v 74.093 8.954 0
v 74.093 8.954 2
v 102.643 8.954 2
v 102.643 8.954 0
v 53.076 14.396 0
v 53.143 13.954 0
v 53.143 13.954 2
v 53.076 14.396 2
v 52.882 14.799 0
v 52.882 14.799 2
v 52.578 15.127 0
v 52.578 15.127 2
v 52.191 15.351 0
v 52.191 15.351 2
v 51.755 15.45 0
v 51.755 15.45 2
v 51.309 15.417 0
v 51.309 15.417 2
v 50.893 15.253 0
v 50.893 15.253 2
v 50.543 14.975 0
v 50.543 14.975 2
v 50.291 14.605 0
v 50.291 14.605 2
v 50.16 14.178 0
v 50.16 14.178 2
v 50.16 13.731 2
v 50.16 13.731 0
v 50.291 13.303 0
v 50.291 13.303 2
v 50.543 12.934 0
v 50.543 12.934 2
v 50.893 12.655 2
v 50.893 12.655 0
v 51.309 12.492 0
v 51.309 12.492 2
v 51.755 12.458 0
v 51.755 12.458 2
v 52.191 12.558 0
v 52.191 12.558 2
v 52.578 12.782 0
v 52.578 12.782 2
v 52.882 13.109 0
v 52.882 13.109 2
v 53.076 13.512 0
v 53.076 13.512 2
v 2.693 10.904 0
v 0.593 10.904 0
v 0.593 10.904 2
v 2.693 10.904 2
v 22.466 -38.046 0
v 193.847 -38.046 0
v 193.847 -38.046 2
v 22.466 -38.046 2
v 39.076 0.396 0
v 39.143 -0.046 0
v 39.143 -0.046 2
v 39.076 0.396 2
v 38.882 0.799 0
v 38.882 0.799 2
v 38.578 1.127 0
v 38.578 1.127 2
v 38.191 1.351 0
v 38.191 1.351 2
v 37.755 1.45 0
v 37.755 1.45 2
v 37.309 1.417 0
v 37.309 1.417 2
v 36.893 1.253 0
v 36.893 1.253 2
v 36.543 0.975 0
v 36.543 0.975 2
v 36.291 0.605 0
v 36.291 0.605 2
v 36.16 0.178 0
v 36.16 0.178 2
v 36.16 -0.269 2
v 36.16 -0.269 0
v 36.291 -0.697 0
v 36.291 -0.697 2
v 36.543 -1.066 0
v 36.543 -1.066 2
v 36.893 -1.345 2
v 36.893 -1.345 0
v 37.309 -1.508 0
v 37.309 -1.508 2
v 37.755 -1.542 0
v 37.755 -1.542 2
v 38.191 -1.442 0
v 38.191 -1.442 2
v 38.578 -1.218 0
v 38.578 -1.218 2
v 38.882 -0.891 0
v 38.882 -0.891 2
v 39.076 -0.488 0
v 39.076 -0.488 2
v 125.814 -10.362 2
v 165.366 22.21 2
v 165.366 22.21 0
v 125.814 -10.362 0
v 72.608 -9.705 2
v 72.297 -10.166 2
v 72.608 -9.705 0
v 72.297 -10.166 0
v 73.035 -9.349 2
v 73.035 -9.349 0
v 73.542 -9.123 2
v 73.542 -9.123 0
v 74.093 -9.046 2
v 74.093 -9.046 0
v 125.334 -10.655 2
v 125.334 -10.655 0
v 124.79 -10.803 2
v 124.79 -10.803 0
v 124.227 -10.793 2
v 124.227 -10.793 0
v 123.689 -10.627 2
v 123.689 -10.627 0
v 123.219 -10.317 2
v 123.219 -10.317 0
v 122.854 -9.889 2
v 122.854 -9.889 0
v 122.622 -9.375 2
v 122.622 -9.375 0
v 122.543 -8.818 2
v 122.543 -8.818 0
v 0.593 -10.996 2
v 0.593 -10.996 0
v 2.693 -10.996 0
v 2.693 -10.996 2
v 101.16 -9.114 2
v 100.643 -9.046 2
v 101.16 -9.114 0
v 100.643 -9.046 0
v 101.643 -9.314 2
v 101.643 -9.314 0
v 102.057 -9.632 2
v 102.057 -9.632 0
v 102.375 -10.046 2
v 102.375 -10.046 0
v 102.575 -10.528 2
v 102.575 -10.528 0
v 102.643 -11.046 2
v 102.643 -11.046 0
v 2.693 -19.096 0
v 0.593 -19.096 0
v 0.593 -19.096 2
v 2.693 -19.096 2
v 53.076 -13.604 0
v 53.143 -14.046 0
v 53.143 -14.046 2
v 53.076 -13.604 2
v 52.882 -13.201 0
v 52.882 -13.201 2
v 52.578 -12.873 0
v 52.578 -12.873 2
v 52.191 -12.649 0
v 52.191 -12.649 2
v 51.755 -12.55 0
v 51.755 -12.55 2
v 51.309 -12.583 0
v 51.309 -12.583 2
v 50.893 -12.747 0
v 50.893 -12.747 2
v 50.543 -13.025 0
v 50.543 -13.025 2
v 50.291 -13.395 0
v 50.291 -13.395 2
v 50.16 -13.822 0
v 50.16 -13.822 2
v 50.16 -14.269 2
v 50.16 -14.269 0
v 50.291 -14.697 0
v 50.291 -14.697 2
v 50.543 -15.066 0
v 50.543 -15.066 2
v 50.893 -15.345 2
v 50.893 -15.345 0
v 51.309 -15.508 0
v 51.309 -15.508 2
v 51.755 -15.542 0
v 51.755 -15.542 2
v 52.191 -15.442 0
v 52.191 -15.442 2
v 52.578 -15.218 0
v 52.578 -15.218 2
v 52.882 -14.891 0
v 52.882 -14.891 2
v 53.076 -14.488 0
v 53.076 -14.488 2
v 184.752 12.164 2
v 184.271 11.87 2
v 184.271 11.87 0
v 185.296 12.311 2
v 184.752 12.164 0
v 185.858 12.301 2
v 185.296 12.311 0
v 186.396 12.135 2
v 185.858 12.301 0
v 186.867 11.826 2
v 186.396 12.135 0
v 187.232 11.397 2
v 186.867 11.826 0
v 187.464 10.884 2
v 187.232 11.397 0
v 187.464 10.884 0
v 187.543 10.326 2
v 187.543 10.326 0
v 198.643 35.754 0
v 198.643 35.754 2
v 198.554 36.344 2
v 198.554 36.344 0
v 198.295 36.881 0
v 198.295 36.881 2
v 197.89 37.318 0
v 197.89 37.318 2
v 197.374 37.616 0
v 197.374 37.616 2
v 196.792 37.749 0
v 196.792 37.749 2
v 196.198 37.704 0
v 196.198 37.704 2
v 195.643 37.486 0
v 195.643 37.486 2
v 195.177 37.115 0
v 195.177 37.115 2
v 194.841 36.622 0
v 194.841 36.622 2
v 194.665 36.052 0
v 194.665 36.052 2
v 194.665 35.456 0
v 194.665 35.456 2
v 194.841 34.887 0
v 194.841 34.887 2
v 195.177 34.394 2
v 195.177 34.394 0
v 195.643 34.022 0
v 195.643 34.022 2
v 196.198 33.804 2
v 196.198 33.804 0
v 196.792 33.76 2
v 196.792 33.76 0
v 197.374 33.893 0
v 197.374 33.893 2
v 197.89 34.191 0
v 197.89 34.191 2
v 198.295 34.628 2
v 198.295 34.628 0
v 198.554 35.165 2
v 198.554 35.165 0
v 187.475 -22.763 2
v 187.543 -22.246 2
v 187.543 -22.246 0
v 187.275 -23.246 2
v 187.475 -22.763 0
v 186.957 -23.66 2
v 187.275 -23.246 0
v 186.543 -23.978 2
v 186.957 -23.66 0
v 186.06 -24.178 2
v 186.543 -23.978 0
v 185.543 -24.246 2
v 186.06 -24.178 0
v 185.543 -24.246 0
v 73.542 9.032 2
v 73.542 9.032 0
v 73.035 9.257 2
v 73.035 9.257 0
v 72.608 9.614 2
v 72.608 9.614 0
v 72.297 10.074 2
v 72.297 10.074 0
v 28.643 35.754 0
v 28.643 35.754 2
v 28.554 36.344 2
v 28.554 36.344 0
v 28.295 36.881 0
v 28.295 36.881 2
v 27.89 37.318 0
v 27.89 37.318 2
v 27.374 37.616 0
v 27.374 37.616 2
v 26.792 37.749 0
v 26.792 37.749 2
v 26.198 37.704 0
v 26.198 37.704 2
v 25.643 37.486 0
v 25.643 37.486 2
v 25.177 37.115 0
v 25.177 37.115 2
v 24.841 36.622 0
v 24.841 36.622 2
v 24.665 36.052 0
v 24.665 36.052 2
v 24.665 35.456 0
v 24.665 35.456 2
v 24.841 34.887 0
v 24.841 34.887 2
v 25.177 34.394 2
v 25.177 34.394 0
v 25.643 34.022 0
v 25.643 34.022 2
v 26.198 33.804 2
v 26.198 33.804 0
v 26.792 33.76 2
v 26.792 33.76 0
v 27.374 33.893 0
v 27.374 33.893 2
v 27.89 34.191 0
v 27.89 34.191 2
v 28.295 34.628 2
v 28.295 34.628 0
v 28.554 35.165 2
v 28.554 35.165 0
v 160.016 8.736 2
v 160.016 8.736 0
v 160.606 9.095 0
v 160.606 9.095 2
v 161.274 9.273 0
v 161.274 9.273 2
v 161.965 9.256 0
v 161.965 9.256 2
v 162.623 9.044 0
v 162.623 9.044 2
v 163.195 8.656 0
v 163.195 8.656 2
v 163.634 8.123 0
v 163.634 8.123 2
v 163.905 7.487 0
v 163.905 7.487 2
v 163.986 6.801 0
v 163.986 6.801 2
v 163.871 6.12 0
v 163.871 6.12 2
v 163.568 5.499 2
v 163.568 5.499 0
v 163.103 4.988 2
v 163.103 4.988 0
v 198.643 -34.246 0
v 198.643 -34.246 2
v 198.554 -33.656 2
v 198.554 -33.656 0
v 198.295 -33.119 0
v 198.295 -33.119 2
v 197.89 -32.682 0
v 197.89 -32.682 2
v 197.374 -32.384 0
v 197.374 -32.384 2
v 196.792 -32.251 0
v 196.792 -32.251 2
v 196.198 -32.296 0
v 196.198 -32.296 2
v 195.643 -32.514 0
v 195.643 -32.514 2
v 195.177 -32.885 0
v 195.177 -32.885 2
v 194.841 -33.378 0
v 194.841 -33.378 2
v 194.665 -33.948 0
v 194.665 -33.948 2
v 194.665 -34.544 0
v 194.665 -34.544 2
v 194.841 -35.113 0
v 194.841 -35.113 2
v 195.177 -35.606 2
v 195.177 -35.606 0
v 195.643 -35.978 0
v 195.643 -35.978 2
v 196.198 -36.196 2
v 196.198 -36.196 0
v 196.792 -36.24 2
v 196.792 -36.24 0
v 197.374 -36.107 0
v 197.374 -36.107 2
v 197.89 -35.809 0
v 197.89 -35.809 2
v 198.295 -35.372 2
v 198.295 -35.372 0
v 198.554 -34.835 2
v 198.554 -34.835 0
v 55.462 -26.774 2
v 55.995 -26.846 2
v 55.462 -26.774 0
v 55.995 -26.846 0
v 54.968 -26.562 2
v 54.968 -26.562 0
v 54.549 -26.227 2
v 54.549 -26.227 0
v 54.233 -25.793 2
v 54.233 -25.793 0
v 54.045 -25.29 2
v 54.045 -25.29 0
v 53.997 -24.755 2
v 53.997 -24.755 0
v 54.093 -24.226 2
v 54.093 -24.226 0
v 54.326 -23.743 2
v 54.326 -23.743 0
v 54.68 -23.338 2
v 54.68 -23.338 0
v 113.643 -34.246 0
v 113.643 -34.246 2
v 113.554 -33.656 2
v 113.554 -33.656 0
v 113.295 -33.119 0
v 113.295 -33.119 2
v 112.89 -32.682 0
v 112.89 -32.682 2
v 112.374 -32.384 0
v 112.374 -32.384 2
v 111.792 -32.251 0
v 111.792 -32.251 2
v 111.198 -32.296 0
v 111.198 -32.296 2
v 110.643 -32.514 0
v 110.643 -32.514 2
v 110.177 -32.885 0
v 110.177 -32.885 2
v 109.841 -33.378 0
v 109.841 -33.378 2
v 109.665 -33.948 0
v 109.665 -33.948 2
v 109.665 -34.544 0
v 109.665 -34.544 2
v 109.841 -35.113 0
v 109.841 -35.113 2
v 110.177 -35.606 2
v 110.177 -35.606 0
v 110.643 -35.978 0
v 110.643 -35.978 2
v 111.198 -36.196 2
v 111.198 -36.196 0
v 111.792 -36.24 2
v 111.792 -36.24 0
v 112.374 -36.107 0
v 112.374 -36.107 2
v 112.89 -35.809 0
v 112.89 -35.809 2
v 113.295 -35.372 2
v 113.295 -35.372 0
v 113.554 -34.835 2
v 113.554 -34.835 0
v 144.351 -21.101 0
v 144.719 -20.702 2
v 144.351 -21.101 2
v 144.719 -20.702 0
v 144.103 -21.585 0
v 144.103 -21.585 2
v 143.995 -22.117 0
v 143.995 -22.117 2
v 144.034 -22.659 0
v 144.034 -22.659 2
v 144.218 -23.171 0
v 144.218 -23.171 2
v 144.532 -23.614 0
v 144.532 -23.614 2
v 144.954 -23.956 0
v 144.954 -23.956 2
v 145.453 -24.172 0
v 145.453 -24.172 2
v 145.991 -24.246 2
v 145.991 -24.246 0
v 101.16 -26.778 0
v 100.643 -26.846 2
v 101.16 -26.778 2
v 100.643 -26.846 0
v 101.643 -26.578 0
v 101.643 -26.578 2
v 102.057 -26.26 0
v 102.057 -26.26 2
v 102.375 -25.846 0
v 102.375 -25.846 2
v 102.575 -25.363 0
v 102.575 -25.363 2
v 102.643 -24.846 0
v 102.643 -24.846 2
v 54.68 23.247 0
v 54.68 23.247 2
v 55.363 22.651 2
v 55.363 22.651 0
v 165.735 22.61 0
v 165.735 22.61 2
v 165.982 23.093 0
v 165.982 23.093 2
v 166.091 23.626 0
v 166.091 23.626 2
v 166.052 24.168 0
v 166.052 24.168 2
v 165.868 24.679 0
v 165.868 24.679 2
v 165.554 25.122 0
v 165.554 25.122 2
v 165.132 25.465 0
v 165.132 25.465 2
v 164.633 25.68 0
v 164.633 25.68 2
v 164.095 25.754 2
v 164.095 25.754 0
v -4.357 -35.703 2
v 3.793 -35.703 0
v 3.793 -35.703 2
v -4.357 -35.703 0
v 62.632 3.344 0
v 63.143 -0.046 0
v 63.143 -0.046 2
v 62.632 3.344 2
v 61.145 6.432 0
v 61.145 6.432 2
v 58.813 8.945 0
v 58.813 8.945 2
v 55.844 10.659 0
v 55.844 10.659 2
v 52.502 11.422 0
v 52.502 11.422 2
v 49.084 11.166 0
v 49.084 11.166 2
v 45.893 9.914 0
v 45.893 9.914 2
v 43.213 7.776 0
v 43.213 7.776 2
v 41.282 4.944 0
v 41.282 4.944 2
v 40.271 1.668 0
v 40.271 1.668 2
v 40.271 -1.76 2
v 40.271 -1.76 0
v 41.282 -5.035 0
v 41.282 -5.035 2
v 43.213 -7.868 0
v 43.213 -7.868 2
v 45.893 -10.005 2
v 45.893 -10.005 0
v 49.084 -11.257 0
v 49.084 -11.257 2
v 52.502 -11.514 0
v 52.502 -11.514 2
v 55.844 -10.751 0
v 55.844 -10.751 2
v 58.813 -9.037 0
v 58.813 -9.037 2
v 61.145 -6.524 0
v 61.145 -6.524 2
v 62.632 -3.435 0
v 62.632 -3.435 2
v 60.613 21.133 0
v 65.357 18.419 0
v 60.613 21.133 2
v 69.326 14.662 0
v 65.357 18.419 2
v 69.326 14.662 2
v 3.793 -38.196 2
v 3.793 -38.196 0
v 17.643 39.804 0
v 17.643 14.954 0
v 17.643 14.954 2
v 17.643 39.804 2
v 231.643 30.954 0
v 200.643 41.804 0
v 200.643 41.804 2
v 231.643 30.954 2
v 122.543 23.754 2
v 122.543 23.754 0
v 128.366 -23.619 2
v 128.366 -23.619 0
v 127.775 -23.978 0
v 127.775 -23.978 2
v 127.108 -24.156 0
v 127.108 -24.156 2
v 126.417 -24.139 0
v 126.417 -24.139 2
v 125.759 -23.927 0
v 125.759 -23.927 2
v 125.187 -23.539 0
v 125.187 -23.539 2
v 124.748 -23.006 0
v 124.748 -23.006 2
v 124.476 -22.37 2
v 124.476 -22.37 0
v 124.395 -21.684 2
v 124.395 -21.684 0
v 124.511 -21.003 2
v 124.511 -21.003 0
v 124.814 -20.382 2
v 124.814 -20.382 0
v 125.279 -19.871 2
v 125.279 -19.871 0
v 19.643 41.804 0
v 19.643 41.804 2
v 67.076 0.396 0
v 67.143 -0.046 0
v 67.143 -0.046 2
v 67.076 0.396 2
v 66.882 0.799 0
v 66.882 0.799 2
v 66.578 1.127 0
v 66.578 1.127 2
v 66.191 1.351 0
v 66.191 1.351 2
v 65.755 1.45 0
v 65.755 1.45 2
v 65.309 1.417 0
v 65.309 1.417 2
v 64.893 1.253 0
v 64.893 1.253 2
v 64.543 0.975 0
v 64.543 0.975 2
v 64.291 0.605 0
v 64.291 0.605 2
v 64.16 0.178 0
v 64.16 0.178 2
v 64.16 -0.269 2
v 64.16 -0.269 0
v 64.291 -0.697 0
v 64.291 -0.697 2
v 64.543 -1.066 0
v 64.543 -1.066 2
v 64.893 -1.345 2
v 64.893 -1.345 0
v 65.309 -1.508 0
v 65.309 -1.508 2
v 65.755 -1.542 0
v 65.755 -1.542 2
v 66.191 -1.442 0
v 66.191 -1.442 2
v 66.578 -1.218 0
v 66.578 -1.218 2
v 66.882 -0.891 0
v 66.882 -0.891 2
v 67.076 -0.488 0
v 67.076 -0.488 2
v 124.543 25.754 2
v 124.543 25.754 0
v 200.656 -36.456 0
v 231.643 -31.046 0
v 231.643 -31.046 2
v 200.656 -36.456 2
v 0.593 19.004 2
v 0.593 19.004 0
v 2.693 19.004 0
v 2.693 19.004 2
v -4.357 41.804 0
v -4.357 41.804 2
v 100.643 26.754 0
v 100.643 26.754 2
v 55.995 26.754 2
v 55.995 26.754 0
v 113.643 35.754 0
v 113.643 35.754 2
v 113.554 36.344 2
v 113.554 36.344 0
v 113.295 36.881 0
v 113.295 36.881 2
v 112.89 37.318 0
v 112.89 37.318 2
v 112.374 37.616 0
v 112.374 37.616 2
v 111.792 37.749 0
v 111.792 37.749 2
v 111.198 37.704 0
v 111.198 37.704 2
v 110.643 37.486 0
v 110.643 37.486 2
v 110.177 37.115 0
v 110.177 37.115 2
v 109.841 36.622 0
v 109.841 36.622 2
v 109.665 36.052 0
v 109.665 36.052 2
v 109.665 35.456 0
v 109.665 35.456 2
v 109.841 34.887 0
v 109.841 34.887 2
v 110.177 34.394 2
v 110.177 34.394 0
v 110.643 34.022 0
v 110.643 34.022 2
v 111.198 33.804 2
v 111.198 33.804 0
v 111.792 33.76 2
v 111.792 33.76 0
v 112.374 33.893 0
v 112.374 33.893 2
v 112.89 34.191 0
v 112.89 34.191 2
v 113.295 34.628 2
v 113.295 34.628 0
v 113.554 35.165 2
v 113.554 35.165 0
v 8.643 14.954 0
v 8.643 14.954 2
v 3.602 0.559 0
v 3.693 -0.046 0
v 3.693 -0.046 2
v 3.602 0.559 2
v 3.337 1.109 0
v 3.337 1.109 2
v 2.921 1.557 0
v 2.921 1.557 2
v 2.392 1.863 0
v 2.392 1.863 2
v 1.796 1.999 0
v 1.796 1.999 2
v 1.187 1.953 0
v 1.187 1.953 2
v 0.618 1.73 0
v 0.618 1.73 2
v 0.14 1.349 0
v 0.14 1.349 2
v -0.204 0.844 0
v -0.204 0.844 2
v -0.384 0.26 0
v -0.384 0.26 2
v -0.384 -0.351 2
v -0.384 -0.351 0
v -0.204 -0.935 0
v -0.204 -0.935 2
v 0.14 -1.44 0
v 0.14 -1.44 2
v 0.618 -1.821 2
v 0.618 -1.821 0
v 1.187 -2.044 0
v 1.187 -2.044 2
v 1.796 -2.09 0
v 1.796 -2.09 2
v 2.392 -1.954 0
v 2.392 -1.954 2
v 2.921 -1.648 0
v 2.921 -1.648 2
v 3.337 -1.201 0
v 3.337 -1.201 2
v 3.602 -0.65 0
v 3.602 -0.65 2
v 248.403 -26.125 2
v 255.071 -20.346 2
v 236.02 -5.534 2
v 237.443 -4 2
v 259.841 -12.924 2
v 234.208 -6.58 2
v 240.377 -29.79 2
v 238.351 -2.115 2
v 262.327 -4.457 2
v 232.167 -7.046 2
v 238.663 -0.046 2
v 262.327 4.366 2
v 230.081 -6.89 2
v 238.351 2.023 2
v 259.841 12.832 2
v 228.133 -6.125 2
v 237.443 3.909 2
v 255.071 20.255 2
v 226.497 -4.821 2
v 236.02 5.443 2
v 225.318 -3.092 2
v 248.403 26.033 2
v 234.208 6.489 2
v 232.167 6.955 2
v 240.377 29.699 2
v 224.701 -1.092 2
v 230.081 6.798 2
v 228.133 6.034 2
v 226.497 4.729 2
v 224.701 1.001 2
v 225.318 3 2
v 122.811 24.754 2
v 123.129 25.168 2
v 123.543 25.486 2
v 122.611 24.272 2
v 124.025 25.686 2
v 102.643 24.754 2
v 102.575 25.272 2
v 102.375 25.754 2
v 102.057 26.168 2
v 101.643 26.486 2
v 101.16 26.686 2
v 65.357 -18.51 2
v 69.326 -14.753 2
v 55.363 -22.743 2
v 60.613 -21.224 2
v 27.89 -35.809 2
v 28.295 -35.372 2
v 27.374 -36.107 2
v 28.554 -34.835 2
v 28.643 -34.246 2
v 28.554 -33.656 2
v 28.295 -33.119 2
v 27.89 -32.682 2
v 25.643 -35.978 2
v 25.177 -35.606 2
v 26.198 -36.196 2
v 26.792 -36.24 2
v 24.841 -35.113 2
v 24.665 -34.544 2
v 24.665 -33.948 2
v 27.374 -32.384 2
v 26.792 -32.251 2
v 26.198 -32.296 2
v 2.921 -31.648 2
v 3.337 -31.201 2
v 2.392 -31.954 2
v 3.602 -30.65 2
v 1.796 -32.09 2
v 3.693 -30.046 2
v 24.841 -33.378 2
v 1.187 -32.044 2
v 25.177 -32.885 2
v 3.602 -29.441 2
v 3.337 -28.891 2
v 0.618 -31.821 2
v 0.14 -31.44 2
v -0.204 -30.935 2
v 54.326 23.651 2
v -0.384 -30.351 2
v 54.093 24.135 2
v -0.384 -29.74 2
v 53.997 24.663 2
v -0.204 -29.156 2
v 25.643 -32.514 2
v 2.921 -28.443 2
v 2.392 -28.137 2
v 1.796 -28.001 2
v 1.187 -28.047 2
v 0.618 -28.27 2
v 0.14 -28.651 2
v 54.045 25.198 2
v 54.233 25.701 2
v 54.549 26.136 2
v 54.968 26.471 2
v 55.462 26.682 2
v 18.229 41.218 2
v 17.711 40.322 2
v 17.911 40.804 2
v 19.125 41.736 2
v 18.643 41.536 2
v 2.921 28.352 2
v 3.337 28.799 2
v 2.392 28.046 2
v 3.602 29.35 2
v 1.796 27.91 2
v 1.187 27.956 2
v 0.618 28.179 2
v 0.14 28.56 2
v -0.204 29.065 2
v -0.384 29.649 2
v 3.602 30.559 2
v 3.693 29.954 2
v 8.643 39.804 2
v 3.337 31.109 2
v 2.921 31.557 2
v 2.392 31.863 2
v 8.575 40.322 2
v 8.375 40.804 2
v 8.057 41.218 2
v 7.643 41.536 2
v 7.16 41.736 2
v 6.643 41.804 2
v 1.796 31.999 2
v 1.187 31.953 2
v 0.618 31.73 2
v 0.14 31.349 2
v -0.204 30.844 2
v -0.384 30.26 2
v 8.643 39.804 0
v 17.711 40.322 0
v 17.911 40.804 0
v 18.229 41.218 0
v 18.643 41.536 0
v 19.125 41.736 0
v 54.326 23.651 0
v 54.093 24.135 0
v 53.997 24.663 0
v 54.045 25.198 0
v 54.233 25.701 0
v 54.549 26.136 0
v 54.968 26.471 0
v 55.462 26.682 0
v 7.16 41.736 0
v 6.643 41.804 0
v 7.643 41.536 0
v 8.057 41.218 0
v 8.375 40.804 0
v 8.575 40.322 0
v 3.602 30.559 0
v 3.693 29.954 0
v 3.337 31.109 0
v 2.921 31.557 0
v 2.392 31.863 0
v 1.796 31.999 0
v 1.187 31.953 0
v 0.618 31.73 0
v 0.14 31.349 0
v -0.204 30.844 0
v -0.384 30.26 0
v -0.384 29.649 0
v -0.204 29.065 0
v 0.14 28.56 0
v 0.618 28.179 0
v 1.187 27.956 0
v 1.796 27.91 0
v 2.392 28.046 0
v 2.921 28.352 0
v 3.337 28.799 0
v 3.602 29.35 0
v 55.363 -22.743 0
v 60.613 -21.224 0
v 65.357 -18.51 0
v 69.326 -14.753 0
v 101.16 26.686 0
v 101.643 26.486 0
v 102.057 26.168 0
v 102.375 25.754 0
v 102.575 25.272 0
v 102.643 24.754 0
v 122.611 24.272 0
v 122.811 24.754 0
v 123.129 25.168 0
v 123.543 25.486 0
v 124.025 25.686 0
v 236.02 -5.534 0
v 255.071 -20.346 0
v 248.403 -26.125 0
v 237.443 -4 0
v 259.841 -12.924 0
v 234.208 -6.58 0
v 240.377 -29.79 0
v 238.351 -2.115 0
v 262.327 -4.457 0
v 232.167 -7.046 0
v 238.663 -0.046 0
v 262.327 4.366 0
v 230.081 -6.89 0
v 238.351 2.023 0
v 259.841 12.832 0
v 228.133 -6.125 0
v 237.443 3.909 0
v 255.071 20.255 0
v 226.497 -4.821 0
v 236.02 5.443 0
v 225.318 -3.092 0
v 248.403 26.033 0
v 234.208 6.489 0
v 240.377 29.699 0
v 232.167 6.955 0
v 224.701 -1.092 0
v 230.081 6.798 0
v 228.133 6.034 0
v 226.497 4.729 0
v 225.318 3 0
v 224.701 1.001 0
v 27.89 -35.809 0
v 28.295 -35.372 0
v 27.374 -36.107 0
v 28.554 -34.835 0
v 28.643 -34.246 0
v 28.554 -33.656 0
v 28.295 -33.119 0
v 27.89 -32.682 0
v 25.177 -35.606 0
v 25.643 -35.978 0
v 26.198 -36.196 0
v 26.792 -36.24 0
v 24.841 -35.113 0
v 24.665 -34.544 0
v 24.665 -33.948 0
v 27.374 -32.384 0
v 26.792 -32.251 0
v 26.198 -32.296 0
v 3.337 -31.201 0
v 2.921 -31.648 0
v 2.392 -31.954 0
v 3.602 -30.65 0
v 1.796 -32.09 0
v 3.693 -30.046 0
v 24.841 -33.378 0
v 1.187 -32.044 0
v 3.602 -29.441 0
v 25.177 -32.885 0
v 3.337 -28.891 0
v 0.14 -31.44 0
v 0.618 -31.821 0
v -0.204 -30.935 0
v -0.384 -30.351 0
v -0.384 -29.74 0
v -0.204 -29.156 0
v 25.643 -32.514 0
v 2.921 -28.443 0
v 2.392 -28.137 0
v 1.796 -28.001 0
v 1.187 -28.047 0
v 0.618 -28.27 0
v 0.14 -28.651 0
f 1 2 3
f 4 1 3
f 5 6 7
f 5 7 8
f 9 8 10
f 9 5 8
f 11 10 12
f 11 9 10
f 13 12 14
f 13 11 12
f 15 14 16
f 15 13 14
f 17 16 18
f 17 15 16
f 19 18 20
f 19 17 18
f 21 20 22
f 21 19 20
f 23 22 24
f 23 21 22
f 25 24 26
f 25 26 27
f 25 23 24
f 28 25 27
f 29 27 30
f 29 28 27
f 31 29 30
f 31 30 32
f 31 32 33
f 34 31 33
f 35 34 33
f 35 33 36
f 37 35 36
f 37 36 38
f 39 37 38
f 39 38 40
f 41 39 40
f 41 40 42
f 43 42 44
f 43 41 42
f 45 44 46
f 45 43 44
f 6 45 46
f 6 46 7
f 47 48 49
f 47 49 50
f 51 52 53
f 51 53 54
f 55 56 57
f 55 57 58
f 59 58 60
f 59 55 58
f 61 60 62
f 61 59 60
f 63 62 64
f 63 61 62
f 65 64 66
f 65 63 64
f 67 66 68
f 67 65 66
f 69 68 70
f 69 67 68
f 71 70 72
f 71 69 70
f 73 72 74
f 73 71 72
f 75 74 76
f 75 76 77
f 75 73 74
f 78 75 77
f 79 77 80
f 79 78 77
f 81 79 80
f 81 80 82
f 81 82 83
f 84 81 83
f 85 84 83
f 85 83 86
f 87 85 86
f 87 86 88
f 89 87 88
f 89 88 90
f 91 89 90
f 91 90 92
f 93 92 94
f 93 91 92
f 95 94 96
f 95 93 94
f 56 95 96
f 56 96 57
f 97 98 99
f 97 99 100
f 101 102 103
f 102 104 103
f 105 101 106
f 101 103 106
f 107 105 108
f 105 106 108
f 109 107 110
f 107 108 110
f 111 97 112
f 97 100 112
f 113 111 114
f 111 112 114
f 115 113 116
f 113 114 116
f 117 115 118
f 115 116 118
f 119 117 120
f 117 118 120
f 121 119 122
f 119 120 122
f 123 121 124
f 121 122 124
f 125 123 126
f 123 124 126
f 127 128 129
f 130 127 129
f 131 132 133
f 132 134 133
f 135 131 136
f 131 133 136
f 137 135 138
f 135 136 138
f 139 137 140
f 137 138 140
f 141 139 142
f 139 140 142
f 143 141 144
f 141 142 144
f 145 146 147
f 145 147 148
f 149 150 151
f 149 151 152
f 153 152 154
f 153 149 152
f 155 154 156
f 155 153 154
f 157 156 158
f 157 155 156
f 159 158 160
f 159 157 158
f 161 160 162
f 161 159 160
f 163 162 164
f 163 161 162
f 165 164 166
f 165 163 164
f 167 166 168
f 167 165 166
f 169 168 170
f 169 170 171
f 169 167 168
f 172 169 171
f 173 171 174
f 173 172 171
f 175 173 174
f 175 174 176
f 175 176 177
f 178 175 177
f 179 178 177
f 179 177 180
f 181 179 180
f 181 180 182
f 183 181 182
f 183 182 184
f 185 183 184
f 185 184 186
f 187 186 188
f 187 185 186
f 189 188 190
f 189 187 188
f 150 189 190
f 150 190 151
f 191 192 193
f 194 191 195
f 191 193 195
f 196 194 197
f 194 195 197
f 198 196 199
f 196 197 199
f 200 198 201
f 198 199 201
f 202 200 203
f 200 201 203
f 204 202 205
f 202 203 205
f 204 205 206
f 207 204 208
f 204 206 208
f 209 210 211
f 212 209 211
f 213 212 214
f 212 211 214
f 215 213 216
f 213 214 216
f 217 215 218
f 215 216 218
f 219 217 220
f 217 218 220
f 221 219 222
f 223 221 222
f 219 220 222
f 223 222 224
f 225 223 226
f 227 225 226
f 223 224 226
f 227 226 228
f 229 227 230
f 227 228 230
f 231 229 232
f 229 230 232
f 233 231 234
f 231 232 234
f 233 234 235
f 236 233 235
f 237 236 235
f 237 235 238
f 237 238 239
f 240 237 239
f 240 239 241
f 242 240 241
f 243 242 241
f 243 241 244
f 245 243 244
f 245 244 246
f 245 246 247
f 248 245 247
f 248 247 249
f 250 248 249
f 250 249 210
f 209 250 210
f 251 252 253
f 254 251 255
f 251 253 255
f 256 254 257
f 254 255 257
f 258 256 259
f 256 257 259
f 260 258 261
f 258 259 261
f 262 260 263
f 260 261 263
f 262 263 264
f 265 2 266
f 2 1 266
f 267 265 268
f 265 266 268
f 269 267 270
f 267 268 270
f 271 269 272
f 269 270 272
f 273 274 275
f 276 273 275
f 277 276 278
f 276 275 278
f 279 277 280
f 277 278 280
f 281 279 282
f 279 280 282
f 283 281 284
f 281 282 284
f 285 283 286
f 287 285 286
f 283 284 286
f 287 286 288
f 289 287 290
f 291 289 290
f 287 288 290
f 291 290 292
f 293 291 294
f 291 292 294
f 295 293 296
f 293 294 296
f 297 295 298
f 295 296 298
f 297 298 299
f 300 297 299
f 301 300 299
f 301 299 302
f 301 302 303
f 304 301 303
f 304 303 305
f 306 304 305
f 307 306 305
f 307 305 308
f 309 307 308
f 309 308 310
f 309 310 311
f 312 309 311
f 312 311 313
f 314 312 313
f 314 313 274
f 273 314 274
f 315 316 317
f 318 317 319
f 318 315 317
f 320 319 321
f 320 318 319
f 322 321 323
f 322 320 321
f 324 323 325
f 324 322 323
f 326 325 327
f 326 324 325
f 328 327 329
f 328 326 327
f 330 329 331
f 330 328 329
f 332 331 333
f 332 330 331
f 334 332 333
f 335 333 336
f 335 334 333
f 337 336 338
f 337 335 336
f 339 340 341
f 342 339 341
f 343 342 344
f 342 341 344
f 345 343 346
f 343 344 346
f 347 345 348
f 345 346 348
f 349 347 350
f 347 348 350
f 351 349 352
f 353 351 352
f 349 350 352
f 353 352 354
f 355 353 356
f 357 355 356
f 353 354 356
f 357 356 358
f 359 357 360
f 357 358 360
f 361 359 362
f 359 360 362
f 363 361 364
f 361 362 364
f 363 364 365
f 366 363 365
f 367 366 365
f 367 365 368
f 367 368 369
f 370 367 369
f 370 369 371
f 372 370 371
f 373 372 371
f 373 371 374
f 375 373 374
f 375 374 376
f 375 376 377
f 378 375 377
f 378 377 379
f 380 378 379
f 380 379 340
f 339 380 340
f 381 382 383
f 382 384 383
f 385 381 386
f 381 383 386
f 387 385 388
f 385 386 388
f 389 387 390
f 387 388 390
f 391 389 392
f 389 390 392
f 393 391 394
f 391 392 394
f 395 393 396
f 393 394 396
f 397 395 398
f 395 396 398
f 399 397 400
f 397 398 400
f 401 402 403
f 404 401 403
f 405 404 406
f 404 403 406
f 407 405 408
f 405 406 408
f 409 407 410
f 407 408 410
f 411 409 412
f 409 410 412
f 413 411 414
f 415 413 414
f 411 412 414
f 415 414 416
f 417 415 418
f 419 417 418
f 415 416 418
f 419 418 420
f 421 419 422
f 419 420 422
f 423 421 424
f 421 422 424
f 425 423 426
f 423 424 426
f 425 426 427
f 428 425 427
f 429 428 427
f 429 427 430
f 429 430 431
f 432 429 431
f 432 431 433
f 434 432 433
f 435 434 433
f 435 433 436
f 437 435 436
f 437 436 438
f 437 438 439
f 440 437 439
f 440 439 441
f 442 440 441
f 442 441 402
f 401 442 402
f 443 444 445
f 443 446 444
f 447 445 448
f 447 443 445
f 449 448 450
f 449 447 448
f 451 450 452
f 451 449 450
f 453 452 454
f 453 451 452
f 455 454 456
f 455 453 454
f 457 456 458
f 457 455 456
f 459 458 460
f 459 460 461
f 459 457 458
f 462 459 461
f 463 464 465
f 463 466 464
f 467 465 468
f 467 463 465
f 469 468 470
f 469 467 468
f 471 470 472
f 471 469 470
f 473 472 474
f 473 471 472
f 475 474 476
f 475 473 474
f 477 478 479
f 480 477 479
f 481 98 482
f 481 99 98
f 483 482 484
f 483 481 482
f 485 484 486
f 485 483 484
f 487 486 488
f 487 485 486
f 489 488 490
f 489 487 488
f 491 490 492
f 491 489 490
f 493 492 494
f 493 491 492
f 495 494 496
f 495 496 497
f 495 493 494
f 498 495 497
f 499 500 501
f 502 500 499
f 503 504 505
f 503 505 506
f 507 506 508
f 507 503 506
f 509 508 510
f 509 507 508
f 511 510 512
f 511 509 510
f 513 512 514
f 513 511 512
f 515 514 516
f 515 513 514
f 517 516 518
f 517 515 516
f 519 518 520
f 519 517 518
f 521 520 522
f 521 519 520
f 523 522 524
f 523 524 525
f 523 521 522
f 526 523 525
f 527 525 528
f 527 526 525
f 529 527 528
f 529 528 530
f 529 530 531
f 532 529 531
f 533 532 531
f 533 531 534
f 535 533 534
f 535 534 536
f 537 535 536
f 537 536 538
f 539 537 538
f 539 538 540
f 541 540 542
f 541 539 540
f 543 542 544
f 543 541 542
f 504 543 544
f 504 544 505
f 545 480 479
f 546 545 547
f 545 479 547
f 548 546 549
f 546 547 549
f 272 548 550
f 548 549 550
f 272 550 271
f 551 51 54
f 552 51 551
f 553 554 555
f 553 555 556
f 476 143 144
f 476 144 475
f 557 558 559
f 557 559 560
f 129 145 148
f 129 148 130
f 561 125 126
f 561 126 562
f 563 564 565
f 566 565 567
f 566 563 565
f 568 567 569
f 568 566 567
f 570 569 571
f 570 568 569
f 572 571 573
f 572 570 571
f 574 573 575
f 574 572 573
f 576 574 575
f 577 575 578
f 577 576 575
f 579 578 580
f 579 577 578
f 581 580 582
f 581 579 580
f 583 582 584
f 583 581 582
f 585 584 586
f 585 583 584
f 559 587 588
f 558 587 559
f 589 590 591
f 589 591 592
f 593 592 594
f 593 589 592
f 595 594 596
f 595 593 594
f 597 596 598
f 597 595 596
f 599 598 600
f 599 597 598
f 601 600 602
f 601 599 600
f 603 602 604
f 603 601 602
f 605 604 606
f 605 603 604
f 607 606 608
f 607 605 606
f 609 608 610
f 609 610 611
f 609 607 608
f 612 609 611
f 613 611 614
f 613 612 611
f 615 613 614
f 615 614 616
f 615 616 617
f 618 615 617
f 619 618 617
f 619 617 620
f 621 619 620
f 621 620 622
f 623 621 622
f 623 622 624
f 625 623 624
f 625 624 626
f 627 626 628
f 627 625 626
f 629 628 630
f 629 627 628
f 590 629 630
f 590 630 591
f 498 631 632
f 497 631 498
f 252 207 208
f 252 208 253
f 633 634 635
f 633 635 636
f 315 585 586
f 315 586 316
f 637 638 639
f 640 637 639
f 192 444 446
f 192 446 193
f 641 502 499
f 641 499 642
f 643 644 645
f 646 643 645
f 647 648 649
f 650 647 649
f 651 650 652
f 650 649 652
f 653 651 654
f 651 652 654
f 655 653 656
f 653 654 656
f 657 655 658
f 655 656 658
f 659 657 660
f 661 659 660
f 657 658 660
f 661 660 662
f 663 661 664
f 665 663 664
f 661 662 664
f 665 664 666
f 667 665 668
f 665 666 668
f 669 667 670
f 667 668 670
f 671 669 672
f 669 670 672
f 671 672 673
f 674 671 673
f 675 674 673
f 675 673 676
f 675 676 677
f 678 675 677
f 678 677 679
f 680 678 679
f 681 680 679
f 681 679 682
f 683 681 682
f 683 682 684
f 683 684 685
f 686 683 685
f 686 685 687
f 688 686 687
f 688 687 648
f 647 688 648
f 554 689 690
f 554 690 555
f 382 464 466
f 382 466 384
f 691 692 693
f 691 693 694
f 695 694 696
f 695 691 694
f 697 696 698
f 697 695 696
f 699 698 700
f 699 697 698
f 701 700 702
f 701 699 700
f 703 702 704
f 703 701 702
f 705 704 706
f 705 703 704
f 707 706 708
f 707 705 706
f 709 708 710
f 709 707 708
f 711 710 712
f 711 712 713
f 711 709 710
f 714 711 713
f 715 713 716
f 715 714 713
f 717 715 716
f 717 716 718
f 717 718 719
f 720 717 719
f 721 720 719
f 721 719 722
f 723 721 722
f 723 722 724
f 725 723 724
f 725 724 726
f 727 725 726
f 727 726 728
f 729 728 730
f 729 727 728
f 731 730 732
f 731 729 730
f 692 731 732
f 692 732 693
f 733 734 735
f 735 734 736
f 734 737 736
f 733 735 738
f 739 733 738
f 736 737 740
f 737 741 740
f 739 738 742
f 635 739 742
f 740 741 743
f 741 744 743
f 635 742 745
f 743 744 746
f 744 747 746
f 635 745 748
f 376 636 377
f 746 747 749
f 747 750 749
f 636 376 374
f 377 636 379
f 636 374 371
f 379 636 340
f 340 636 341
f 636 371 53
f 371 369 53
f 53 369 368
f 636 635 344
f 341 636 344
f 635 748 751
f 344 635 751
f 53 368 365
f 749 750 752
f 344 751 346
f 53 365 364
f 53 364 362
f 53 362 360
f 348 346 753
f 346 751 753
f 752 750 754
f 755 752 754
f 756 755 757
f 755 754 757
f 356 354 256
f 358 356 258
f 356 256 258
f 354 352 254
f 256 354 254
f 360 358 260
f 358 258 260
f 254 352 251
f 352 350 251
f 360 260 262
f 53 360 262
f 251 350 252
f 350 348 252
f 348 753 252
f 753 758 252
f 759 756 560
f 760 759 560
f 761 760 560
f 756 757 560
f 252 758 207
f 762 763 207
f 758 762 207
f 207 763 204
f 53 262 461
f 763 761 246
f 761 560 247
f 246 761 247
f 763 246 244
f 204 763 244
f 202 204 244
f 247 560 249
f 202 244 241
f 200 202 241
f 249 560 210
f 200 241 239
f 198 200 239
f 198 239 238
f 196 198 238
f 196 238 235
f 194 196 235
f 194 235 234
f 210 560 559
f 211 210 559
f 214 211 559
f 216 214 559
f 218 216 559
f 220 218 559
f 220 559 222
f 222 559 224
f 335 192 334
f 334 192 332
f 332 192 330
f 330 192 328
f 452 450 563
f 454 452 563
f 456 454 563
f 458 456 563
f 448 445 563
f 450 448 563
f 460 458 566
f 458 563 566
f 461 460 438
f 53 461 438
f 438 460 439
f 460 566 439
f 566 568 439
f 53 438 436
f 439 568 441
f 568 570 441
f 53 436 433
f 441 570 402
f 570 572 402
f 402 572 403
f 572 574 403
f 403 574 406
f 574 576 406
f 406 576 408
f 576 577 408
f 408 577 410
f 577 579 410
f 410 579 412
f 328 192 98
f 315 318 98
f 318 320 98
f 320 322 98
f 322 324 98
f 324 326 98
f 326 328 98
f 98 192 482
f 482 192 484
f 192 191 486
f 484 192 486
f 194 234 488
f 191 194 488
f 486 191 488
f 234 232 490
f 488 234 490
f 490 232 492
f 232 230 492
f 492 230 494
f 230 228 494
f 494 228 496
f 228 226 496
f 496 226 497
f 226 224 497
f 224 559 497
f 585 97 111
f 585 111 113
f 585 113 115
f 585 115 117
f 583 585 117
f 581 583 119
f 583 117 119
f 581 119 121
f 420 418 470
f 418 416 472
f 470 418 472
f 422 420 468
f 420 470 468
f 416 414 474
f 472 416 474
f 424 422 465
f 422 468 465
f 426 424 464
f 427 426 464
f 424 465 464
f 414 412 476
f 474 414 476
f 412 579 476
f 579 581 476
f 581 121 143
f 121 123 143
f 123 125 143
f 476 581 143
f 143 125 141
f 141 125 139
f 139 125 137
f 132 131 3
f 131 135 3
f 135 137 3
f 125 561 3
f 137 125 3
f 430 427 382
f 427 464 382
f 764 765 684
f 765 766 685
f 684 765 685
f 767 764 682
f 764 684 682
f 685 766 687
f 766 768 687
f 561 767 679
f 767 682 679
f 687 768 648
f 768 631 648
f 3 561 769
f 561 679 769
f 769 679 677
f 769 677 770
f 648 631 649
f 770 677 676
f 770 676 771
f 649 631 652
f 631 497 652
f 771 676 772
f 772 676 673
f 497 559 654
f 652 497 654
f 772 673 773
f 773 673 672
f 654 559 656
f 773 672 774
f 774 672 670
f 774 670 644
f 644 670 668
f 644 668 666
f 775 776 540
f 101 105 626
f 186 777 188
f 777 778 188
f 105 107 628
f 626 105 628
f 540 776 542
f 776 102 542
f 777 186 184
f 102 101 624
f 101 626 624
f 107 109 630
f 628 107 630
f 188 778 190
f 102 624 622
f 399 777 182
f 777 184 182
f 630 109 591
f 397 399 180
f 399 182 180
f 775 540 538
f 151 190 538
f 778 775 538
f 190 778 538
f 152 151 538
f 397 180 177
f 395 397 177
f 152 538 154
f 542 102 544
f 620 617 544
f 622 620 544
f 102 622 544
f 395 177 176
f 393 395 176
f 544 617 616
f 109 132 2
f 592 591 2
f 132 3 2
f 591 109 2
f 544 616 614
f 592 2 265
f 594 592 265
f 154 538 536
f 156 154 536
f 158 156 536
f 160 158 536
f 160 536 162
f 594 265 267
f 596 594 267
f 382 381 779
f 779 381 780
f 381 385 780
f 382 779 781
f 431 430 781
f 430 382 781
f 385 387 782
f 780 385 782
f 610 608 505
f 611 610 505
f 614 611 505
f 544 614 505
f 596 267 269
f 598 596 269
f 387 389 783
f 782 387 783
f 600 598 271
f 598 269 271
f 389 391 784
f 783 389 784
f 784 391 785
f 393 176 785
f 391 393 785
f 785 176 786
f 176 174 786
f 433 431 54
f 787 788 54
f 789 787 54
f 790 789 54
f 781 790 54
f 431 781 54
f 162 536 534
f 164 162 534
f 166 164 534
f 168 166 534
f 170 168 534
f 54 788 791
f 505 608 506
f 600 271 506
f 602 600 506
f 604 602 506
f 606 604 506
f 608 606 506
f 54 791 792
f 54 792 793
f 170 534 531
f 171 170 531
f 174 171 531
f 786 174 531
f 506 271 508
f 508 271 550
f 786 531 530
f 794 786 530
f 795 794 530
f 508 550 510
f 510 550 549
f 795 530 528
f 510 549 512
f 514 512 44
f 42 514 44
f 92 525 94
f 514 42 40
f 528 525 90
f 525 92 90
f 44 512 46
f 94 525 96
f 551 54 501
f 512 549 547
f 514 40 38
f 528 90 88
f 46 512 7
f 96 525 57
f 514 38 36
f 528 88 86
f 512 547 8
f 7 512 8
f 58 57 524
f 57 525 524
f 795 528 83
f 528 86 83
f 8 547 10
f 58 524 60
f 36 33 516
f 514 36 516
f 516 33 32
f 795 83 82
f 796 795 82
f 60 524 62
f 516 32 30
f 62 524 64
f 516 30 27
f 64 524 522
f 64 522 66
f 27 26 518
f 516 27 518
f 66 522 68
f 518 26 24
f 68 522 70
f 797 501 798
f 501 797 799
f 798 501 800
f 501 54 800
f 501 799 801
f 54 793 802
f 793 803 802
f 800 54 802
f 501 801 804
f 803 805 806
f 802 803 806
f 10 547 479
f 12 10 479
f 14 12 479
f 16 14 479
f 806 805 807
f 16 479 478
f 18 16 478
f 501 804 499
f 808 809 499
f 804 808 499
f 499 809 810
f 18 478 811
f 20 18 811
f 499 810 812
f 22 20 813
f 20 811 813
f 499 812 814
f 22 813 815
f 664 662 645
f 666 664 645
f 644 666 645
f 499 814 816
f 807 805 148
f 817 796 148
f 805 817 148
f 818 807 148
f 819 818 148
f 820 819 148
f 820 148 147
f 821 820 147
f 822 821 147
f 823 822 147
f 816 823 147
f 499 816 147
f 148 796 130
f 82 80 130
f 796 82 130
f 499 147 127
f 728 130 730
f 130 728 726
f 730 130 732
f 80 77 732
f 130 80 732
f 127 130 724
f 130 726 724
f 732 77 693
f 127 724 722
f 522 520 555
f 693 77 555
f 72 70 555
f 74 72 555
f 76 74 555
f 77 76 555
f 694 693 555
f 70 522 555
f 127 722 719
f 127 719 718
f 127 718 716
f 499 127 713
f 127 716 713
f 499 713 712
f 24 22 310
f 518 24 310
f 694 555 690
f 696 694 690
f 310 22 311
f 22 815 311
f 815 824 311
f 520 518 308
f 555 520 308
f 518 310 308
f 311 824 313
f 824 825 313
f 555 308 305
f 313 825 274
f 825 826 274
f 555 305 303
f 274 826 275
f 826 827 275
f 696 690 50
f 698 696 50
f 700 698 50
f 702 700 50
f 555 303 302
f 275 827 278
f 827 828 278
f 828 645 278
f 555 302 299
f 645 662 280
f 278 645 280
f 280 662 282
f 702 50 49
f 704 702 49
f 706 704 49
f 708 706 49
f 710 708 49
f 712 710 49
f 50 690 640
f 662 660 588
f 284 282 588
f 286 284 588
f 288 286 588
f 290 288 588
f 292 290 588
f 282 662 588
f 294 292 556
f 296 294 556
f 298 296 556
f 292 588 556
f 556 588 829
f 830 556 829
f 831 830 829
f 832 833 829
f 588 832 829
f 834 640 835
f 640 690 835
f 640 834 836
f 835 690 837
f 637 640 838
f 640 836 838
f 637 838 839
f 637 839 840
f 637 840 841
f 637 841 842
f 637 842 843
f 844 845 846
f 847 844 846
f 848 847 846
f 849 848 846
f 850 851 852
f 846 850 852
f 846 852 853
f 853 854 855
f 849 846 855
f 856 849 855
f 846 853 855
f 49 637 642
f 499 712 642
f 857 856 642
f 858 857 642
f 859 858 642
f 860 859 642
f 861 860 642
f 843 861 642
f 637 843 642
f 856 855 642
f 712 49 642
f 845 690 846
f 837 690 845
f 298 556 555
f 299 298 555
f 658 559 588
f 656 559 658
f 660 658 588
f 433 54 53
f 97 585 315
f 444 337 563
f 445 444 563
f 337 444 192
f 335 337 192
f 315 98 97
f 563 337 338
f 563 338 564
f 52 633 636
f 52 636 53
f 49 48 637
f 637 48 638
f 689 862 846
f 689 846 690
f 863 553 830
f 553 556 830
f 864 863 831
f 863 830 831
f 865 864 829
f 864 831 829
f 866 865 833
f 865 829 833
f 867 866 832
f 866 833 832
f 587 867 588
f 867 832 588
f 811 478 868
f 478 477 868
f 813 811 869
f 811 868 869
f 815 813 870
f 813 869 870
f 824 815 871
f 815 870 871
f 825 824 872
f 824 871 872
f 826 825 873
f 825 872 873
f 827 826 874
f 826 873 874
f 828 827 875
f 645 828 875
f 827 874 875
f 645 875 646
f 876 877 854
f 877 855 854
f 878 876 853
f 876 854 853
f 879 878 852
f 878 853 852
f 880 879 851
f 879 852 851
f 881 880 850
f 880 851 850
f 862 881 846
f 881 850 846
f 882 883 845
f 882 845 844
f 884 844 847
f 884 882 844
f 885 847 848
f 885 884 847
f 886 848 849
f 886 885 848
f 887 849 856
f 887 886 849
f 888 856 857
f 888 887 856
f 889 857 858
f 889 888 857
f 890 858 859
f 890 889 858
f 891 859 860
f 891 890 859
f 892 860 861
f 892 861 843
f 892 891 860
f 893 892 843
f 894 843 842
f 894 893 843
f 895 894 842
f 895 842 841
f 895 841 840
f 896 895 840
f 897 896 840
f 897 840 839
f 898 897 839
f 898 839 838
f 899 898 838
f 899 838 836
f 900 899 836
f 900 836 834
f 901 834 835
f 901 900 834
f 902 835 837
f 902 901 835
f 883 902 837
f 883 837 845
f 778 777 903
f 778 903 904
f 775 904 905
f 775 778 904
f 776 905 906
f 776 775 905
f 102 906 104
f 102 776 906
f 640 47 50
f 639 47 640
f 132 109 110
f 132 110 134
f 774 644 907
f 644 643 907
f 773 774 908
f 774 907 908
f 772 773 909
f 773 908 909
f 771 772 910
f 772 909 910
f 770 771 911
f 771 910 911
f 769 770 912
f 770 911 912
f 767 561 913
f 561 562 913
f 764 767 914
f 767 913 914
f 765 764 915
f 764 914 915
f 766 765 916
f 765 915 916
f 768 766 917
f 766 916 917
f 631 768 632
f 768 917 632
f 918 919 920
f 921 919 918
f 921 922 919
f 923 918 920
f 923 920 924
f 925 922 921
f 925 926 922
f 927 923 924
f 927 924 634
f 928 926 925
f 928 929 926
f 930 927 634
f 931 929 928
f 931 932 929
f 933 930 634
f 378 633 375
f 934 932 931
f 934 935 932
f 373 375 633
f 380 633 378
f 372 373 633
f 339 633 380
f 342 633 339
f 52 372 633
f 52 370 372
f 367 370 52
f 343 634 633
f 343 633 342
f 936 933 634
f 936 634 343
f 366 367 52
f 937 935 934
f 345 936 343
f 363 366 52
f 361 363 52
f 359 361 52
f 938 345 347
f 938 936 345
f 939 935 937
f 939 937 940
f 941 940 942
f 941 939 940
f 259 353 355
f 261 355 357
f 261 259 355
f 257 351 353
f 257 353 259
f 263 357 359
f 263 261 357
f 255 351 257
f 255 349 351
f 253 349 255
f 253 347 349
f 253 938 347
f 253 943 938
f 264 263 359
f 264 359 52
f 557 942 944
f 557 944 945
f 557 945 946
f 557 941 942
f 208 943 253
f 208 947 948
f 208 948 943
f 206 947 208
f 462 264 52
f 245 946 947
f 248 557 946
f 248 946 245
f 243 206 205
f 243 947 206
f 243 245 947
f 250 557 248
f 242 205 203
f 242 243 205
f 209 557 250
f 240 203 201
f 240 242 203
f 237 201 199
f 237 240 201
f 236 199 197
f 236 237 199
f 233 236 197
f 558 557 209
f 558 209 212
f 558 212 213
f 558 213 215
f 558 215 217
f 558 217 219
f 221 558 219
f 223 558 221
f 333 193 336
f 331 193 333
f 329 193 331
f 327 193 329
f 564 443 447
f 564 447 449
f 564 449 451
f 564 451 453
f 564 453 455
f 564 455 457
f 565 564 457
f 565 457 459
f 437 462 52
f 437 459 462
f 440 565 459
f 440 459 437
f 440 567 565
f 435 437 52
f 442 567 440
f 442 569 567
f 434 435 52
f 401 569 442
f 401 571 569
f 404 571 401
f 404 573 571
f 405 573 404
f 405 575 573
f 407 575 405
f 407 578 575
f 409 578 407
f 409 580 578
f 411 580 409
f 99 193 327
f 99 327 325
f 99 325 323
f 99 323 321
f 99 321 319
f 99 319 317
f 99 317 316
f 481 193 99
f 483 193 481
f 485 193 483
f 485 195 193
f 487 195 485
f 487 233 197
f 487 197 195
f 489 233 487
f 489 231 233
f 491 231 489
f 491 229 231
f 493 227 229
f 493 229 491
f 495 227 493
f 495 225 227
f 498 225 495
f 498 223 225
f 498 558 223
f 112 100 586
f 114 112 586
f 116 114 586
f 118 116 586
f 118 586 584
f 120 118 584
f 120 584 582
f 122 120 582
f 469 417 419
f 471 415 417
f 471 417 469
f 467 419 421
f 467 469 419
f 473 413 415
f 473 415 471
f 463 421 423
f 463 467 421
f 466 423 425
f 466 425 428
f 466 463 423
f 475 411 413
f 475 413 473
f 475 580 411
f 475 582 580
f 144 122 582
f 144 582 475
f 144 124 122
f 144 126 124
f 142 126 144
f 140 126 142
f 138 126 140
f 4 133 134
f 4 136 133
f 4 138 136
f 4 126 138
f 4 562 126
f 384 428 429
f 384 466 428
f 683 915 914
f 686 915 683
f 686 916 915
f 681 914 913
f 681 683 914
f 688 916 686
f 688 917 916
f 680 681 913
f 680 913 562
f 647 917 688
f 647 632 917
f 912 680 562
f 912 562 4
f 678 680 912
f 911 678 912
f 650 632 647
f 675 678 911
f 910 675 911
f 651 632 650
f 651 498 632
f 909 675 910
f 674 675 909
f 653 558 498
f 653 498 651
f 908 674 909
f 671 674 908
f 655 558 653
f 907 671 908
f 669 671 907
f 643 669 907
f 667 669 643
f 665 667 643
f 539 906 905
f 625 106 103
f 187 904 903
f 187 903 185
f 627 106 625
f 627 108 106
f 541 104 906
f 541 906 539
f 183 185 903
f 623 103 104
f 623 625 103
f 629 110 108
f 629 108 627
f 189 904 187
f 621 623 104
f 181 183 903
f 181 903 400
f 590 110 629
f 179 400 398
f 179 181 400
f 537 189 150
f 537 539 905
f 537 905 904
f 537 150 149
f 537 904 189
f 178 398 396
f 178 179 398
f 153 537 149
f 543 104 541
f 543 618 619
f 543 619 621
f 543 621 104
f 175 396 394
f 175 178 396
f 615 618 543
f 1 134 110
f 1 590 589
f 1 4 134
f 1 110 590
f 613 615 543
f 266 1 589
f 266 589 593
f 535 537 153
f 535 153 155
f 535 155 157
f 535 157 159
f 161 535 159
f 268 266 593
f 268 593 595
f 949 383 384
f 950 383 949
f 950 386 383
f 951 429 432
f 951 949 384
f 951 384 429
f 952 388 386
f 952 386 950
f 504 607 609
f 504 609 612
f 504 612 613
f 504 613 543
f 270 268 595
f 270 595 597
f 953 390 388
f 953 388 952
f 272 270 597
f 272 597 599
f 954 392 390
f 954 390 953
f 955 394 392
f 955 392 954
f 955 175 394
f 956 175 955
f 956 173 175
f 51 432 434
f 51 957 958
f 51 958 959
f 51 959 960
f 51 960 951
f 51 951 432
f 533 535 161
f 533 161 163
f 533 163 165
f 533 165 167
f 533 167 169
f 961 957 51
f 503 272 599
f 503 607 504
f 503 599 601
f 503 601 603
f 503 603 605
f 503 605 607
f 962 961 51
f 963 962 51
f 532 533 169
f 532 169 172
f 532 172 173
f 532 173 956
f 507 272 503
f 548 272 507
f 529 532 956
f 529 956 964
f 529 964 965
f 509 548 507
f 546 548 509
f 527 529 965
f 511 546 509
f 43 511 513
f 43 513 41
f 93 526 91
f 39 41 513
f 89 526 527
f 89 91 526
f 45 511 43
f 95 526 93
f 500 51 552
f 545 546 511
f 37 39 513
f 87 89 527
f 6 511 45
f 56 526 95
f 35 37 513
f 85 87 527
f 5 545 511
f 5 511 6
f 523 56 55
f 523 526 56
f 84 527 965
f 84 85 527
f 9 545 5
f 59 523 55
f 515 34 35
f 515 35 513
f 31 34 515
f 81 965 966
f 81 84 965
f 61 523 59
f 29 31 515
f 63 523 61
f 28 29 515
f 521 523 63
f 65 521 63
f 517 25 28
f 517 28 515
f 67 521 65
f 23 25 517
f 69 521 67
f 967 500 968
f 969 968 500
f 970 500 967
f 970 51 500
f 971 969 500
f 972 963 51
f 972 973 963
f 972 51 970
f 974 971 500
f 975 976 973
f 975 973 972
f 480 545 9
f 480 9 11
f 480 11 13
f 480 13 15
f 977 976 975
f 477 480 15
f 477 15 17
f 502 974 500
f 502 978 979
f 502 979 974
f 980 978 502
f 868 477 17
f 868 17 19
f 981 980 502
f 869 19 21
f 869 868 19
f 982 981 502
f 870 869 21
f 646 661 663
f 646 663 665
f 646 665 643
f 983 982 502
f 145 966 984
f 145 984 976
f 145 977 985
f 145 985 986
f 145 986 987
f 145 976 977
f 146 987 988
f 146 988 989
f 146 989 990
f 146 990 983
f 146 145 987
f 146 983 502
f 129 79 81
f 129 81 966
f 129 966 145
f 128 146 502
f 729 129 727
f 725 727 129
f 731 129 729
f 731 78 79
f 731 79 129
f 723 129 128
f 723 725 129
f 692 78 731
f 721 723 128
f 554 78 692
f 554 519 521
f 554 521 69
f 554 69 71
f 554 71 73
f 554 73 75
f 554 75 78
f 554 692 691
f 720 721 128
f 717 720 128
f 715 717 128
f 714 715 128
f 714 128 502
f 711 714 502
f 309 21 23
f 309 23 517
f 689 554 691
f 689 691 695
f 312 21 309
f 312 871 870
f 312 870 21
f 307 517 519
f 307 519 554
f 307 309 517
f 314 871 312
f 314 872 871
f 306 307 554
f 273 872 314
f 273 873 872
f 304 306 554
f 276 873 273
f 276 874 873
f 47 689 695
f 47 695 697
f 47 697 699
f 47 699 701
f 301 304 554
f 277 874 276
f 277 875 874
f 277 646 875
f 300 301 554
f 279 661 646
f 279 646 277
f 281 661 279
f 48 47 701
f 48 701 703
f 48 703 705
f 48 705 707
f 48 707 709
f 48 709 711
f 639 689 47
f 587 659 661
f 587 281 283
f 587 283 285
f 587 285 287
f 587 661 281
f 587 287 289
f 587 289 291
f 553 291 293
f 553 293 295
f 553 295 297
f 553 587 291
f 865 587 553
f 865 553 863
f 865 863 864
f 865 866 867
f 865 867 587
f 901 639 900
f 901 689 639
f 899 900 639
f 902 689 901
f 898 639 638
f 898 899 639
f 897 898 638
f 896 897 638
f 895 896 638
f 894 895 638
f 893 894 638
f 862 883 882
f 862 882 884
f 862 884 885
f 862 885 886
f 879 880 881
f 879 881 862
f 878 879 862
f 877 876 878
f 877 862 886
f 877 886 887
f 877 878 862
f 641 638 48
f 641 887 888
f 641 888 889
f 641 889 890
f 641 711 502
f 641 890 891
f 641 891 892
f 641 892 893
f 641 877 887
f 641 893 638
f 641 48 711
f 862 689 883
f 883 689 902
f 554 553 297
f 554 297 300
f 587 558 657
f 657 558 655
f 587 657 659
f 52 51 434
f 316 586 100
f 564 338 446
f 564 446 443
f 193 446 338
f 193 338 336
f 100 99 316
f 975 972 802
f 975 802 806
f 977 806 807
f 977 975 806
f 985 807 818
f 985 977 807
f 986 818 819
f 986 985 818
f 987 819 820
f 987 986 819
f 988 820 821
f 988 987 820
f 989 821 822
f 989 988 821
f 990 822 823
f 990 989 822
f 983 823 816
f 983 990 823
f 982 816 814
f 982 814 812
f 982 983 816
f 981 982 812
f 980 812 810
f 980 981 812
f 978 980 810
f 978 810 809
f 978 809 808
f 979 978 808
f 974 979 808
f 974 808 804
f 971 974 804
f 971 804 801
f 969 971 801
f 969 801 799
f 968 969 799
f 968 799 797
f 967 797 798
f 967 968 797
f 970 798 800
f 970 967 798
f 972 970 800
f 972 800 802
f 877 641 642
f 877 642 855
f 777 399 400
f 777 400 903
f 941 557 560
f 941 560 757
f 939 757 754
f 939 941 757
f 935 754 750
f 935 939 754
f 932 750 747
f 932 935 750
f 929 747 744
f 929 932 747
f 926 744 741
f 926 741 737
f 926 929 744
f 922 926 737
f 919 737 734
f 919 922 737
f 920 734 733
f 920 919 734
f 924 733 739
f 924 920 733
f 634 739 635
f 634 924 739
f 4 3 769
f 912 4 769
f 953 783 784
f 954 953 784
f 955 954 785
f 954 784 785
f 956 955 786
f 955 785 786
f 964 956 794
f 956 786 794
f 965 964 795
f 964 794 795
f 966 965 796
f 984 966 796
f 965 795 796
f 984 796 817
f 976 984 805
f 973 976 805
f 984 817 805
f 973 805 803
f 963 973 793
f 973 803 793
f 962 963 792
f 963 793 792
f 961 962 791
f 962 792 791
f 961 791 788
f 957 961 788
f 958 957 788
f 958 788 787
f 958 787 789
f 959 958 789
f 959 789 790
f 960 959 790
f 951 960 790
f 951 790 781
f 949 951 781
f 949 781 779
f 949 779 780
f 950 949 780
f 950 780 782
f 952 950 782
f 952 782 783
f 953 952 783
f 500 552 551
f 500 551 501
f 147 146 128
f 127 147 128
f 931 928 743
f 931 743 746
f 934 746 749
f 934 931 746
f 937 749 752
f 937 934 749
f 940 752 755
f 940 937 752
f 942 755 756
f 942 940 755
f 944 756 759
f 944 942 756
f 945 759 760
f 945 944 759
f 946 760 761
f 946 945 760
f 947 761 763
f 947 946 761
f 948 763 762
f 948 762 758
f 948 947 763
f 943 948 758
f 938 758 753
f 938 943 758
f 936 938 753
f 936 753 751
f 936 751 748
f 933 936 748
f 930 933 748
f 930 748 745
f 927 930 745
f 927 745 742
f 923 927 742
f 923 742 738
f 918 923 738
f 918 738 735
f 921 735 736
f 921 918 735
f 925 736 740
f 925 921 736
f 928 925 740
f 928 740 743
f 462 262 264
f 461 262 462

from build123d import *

# Parameters (mm, degrees)
SKETCH_1_R          = 2.05
SKETCH_1_R_2        = 11.5
SKETCH_1_R_3        = 1.5
SKETCH_1_R_4        = 7.02
SKETCH_1_W          = 2.1
SKETCH_1_H          = 8.1
EXTRUDE_1_DEPTH     = 2
SKETCH_2_R          = 2
CUT_EXTRUDE_1_DEPTH = 4
FILLET_1_R          = 2


with BuildPart() as part:
    # 草图1 → 凸台-拉伸1 (new body)
    with BuildSketch(Plane.XY):
        with BuildLine():
            Line((-4.357142857, -0.045714286), (-4.357142857, 41.804285714))
            Line((-4.357142857, 41.804285714), (8.642857143, 41.804285714))
            Line((8.642857143, 41.804285714), (8.642857143, 14.954285714))
            Line((8.642857143, 14.954285714), (17.642857143, 14.954285714))
            Line((17.642857143, 14.954285714), (17.642857143, 41.804285714))
            Line((17.642857143, 41.804285714), (200.642857143, 41.804285714))
            Line((200.642857143, 41.804285714), (231.642857143, 30.954285714))
            ThreePointArc((231.642857143, 30.954285714), (262.642857143, -0.045714286), (231.642857143, -31.045714286))
            Line((231.642857143, -31.045714286), (200.656073527, -36.45591431))
            Line((200.656073527, -36.45591431), (193.846868021, -38.045714286))
            Line((193.846868021, -38.045714286), (22.465844759, -38.045714286))
            Line((22.465844759, -38.045714286), (3.792857143, -38.195714286))
            Line((3.792857143, -38.195714286), (3.792857143, -35.702553436))
            Line((3.792857143, -35.702553436), (-4.357142857, -35.702553436))
            Line((-4.357142857, -35.702553436), (-4.357142857, -0.045714286))
        make_face()
        with Locations((1.642857143, 29.954285714)):
            Circle(SKETCH_1_R, mode=Mode.SUBTRACT)
        with Locations((1.642857143, -0.045714286)):
            Circle(SKETCH_1_R, mode=Mode.SUBTRACT)
        with Locations((1.642857143, -30.045714286)):
            Circle(SKETCH_1_R, mode=Mode.SUBTRACT)
        with Locations((51.642857143, -0.045714286)):
            Circle(SKETCH_1_R_2, mode=Mode.SUBTRACT)
        with Locations((51.642857143, -14.045714286)):
            Circle(SKETCH_1_R_3, mode=Mode.SUBTRACT)
        with Locations((37.642857143, -0.045714286)):
            Circle(SKETCH_1_R_3, mode=Mode.SUBTRACT)
        with Locations((51.642857143, 13.954285714)):
            Circle(SKETCH_1_R_3, mode=Mode.SUBTRACT)
        with Locations((65.642857143, -0.045714286)):
            Circle(SKETCH_1_R_3, mode=Mode.SUBTRACT)
        with Locations((231.642857143, -0.045714286)):
            Circle(SKETCH_1_R_4, mode=Mode.SUBTRACT)
        with Locations((1.642857143, 14.954285714)):
            Rectangle(SKETCH_1_W, SKETCH_1_H, mode=Mode.SUBTRACT)
        with Locations((1.642857143, -15.045714286)):
            Rectangle(SKETCH_1_W, SKETCH_1_H, mode=Mode.SUBTRACT)
    extrude(amount=EXTRUDE_1_DEPTH)

    # 草图2 → 切除-拉伸1 (cut)
    with BuildSketch(Plane.XY.offset(2)):
        with Locations((26.642857143, 35.754285714)):
            Circle(SKETCH_2_R)
        with Locations((111.642857143, 35.754285714)):
            Circle(SKETCH_2_R)
        with Locations((196.642857143, 35.754285714)):
            Circle(SKETCH_2_R)
        with Locations((111.642857143, -34.245714286)):
            Circle(SKETCH_2_R)
        with Locations((196.642857143, -34.245714286)):
            Circle(SKETCH_2_R)
        with Locations((26.642857143, -34.245714286)):
            Circle(SKETCH_2_R)
        Polygon((187.542857143, -24.245714286), (140.41622539, -24.245714286), (187.542857143, 14.56445304), align=None)
        Polygon((122.542857143, 25.754285714), (169.669488896, 25.754285714), (122.542857143, -13.055881612), align=None)
        with BuildLine():
            Line((72.808867631, 8.954285714), (102.642857143, 8.954285714))
            Line((102.642857143, 8.954285714), (102.642857143, 26.754285714))
            Line((102.642857143, 26.754285714), (50.657939371, 26.754285714))
            Line((50.657939371, 26.754285714), (55.363054959, 22.651424922))
            ThreePointArc((55.363054959, 22.651424922), (65.846157695, 18.044787461), (72.808867631, 8.954285714))
        make_face()
        with BuildLine():
            Line((102.642857143, -9.045714286), (102.642857143, -26.845714286))
            Line((102.642857143, -26.845714286), (50.657939371, -26.845714286))
            Line((50.657939371, -26.845714286), (55.363054959, -22.742853493))
            ThreePointArc((55.363054959, -22.742853493), (65.846157695, -18.136216032), (72.808867631, -9.045714286))
            Line((72.808867631, -9.045714286), (102.642857143, -9.045714286))
        make_face()
        with BuildLine():
            Line((125.279005787, -19.870759717), (160.01586639, 8.736066661))
            ThreePointArc((160.01586639, 8.736066661), (163.433418031, 8.405335857), (163.102687227, 4.987784217))
            Line((163.102687227, 4.987784217), (128.365826624, -23.619042162))
            ThreePointArc((128.365826624, -23.619042162), (124.948274984, -23.288311358), (125.279005787, -19.870759717))
        make_face()
    extrude(amount=-CUT_EXTRUDE_1_DEPTH, mode=Mode.SUBTRACT)

    # 圆角1
    fillet_1_edges = [part.edges().sort_by_distance(p)[0] for p in [
        (72.808867631, 8.954285714, 1),
        (50.657939371, 26.754285714, 1),
        (102.642857143, 26.754285714, 1),
        (122.542857143, -13.055881612, 1),
        (122.542857143, 25.754285714, 1),
        (169.669488896, 25.754285714, 1),
        (187.542857143, 14.56445304, 1),
        (187.542857143, -24.245714286, 1),
        (140.41622539, -24.245714286, 1),
        (102.642857143, -26.845714286, 1),
        (50.657939371, -26.845714286, 1),
        (72.808867631, -9.045714286, 1),
        (102.642857143, -9.045714286, 1),
        (8.642857143, 41.804285714, 1),
        (17.642857143, 41.804285714, 1),
    ]]
    fillet(fillet_1_edges, radius=FILLET_1_R)


solid = part.part
